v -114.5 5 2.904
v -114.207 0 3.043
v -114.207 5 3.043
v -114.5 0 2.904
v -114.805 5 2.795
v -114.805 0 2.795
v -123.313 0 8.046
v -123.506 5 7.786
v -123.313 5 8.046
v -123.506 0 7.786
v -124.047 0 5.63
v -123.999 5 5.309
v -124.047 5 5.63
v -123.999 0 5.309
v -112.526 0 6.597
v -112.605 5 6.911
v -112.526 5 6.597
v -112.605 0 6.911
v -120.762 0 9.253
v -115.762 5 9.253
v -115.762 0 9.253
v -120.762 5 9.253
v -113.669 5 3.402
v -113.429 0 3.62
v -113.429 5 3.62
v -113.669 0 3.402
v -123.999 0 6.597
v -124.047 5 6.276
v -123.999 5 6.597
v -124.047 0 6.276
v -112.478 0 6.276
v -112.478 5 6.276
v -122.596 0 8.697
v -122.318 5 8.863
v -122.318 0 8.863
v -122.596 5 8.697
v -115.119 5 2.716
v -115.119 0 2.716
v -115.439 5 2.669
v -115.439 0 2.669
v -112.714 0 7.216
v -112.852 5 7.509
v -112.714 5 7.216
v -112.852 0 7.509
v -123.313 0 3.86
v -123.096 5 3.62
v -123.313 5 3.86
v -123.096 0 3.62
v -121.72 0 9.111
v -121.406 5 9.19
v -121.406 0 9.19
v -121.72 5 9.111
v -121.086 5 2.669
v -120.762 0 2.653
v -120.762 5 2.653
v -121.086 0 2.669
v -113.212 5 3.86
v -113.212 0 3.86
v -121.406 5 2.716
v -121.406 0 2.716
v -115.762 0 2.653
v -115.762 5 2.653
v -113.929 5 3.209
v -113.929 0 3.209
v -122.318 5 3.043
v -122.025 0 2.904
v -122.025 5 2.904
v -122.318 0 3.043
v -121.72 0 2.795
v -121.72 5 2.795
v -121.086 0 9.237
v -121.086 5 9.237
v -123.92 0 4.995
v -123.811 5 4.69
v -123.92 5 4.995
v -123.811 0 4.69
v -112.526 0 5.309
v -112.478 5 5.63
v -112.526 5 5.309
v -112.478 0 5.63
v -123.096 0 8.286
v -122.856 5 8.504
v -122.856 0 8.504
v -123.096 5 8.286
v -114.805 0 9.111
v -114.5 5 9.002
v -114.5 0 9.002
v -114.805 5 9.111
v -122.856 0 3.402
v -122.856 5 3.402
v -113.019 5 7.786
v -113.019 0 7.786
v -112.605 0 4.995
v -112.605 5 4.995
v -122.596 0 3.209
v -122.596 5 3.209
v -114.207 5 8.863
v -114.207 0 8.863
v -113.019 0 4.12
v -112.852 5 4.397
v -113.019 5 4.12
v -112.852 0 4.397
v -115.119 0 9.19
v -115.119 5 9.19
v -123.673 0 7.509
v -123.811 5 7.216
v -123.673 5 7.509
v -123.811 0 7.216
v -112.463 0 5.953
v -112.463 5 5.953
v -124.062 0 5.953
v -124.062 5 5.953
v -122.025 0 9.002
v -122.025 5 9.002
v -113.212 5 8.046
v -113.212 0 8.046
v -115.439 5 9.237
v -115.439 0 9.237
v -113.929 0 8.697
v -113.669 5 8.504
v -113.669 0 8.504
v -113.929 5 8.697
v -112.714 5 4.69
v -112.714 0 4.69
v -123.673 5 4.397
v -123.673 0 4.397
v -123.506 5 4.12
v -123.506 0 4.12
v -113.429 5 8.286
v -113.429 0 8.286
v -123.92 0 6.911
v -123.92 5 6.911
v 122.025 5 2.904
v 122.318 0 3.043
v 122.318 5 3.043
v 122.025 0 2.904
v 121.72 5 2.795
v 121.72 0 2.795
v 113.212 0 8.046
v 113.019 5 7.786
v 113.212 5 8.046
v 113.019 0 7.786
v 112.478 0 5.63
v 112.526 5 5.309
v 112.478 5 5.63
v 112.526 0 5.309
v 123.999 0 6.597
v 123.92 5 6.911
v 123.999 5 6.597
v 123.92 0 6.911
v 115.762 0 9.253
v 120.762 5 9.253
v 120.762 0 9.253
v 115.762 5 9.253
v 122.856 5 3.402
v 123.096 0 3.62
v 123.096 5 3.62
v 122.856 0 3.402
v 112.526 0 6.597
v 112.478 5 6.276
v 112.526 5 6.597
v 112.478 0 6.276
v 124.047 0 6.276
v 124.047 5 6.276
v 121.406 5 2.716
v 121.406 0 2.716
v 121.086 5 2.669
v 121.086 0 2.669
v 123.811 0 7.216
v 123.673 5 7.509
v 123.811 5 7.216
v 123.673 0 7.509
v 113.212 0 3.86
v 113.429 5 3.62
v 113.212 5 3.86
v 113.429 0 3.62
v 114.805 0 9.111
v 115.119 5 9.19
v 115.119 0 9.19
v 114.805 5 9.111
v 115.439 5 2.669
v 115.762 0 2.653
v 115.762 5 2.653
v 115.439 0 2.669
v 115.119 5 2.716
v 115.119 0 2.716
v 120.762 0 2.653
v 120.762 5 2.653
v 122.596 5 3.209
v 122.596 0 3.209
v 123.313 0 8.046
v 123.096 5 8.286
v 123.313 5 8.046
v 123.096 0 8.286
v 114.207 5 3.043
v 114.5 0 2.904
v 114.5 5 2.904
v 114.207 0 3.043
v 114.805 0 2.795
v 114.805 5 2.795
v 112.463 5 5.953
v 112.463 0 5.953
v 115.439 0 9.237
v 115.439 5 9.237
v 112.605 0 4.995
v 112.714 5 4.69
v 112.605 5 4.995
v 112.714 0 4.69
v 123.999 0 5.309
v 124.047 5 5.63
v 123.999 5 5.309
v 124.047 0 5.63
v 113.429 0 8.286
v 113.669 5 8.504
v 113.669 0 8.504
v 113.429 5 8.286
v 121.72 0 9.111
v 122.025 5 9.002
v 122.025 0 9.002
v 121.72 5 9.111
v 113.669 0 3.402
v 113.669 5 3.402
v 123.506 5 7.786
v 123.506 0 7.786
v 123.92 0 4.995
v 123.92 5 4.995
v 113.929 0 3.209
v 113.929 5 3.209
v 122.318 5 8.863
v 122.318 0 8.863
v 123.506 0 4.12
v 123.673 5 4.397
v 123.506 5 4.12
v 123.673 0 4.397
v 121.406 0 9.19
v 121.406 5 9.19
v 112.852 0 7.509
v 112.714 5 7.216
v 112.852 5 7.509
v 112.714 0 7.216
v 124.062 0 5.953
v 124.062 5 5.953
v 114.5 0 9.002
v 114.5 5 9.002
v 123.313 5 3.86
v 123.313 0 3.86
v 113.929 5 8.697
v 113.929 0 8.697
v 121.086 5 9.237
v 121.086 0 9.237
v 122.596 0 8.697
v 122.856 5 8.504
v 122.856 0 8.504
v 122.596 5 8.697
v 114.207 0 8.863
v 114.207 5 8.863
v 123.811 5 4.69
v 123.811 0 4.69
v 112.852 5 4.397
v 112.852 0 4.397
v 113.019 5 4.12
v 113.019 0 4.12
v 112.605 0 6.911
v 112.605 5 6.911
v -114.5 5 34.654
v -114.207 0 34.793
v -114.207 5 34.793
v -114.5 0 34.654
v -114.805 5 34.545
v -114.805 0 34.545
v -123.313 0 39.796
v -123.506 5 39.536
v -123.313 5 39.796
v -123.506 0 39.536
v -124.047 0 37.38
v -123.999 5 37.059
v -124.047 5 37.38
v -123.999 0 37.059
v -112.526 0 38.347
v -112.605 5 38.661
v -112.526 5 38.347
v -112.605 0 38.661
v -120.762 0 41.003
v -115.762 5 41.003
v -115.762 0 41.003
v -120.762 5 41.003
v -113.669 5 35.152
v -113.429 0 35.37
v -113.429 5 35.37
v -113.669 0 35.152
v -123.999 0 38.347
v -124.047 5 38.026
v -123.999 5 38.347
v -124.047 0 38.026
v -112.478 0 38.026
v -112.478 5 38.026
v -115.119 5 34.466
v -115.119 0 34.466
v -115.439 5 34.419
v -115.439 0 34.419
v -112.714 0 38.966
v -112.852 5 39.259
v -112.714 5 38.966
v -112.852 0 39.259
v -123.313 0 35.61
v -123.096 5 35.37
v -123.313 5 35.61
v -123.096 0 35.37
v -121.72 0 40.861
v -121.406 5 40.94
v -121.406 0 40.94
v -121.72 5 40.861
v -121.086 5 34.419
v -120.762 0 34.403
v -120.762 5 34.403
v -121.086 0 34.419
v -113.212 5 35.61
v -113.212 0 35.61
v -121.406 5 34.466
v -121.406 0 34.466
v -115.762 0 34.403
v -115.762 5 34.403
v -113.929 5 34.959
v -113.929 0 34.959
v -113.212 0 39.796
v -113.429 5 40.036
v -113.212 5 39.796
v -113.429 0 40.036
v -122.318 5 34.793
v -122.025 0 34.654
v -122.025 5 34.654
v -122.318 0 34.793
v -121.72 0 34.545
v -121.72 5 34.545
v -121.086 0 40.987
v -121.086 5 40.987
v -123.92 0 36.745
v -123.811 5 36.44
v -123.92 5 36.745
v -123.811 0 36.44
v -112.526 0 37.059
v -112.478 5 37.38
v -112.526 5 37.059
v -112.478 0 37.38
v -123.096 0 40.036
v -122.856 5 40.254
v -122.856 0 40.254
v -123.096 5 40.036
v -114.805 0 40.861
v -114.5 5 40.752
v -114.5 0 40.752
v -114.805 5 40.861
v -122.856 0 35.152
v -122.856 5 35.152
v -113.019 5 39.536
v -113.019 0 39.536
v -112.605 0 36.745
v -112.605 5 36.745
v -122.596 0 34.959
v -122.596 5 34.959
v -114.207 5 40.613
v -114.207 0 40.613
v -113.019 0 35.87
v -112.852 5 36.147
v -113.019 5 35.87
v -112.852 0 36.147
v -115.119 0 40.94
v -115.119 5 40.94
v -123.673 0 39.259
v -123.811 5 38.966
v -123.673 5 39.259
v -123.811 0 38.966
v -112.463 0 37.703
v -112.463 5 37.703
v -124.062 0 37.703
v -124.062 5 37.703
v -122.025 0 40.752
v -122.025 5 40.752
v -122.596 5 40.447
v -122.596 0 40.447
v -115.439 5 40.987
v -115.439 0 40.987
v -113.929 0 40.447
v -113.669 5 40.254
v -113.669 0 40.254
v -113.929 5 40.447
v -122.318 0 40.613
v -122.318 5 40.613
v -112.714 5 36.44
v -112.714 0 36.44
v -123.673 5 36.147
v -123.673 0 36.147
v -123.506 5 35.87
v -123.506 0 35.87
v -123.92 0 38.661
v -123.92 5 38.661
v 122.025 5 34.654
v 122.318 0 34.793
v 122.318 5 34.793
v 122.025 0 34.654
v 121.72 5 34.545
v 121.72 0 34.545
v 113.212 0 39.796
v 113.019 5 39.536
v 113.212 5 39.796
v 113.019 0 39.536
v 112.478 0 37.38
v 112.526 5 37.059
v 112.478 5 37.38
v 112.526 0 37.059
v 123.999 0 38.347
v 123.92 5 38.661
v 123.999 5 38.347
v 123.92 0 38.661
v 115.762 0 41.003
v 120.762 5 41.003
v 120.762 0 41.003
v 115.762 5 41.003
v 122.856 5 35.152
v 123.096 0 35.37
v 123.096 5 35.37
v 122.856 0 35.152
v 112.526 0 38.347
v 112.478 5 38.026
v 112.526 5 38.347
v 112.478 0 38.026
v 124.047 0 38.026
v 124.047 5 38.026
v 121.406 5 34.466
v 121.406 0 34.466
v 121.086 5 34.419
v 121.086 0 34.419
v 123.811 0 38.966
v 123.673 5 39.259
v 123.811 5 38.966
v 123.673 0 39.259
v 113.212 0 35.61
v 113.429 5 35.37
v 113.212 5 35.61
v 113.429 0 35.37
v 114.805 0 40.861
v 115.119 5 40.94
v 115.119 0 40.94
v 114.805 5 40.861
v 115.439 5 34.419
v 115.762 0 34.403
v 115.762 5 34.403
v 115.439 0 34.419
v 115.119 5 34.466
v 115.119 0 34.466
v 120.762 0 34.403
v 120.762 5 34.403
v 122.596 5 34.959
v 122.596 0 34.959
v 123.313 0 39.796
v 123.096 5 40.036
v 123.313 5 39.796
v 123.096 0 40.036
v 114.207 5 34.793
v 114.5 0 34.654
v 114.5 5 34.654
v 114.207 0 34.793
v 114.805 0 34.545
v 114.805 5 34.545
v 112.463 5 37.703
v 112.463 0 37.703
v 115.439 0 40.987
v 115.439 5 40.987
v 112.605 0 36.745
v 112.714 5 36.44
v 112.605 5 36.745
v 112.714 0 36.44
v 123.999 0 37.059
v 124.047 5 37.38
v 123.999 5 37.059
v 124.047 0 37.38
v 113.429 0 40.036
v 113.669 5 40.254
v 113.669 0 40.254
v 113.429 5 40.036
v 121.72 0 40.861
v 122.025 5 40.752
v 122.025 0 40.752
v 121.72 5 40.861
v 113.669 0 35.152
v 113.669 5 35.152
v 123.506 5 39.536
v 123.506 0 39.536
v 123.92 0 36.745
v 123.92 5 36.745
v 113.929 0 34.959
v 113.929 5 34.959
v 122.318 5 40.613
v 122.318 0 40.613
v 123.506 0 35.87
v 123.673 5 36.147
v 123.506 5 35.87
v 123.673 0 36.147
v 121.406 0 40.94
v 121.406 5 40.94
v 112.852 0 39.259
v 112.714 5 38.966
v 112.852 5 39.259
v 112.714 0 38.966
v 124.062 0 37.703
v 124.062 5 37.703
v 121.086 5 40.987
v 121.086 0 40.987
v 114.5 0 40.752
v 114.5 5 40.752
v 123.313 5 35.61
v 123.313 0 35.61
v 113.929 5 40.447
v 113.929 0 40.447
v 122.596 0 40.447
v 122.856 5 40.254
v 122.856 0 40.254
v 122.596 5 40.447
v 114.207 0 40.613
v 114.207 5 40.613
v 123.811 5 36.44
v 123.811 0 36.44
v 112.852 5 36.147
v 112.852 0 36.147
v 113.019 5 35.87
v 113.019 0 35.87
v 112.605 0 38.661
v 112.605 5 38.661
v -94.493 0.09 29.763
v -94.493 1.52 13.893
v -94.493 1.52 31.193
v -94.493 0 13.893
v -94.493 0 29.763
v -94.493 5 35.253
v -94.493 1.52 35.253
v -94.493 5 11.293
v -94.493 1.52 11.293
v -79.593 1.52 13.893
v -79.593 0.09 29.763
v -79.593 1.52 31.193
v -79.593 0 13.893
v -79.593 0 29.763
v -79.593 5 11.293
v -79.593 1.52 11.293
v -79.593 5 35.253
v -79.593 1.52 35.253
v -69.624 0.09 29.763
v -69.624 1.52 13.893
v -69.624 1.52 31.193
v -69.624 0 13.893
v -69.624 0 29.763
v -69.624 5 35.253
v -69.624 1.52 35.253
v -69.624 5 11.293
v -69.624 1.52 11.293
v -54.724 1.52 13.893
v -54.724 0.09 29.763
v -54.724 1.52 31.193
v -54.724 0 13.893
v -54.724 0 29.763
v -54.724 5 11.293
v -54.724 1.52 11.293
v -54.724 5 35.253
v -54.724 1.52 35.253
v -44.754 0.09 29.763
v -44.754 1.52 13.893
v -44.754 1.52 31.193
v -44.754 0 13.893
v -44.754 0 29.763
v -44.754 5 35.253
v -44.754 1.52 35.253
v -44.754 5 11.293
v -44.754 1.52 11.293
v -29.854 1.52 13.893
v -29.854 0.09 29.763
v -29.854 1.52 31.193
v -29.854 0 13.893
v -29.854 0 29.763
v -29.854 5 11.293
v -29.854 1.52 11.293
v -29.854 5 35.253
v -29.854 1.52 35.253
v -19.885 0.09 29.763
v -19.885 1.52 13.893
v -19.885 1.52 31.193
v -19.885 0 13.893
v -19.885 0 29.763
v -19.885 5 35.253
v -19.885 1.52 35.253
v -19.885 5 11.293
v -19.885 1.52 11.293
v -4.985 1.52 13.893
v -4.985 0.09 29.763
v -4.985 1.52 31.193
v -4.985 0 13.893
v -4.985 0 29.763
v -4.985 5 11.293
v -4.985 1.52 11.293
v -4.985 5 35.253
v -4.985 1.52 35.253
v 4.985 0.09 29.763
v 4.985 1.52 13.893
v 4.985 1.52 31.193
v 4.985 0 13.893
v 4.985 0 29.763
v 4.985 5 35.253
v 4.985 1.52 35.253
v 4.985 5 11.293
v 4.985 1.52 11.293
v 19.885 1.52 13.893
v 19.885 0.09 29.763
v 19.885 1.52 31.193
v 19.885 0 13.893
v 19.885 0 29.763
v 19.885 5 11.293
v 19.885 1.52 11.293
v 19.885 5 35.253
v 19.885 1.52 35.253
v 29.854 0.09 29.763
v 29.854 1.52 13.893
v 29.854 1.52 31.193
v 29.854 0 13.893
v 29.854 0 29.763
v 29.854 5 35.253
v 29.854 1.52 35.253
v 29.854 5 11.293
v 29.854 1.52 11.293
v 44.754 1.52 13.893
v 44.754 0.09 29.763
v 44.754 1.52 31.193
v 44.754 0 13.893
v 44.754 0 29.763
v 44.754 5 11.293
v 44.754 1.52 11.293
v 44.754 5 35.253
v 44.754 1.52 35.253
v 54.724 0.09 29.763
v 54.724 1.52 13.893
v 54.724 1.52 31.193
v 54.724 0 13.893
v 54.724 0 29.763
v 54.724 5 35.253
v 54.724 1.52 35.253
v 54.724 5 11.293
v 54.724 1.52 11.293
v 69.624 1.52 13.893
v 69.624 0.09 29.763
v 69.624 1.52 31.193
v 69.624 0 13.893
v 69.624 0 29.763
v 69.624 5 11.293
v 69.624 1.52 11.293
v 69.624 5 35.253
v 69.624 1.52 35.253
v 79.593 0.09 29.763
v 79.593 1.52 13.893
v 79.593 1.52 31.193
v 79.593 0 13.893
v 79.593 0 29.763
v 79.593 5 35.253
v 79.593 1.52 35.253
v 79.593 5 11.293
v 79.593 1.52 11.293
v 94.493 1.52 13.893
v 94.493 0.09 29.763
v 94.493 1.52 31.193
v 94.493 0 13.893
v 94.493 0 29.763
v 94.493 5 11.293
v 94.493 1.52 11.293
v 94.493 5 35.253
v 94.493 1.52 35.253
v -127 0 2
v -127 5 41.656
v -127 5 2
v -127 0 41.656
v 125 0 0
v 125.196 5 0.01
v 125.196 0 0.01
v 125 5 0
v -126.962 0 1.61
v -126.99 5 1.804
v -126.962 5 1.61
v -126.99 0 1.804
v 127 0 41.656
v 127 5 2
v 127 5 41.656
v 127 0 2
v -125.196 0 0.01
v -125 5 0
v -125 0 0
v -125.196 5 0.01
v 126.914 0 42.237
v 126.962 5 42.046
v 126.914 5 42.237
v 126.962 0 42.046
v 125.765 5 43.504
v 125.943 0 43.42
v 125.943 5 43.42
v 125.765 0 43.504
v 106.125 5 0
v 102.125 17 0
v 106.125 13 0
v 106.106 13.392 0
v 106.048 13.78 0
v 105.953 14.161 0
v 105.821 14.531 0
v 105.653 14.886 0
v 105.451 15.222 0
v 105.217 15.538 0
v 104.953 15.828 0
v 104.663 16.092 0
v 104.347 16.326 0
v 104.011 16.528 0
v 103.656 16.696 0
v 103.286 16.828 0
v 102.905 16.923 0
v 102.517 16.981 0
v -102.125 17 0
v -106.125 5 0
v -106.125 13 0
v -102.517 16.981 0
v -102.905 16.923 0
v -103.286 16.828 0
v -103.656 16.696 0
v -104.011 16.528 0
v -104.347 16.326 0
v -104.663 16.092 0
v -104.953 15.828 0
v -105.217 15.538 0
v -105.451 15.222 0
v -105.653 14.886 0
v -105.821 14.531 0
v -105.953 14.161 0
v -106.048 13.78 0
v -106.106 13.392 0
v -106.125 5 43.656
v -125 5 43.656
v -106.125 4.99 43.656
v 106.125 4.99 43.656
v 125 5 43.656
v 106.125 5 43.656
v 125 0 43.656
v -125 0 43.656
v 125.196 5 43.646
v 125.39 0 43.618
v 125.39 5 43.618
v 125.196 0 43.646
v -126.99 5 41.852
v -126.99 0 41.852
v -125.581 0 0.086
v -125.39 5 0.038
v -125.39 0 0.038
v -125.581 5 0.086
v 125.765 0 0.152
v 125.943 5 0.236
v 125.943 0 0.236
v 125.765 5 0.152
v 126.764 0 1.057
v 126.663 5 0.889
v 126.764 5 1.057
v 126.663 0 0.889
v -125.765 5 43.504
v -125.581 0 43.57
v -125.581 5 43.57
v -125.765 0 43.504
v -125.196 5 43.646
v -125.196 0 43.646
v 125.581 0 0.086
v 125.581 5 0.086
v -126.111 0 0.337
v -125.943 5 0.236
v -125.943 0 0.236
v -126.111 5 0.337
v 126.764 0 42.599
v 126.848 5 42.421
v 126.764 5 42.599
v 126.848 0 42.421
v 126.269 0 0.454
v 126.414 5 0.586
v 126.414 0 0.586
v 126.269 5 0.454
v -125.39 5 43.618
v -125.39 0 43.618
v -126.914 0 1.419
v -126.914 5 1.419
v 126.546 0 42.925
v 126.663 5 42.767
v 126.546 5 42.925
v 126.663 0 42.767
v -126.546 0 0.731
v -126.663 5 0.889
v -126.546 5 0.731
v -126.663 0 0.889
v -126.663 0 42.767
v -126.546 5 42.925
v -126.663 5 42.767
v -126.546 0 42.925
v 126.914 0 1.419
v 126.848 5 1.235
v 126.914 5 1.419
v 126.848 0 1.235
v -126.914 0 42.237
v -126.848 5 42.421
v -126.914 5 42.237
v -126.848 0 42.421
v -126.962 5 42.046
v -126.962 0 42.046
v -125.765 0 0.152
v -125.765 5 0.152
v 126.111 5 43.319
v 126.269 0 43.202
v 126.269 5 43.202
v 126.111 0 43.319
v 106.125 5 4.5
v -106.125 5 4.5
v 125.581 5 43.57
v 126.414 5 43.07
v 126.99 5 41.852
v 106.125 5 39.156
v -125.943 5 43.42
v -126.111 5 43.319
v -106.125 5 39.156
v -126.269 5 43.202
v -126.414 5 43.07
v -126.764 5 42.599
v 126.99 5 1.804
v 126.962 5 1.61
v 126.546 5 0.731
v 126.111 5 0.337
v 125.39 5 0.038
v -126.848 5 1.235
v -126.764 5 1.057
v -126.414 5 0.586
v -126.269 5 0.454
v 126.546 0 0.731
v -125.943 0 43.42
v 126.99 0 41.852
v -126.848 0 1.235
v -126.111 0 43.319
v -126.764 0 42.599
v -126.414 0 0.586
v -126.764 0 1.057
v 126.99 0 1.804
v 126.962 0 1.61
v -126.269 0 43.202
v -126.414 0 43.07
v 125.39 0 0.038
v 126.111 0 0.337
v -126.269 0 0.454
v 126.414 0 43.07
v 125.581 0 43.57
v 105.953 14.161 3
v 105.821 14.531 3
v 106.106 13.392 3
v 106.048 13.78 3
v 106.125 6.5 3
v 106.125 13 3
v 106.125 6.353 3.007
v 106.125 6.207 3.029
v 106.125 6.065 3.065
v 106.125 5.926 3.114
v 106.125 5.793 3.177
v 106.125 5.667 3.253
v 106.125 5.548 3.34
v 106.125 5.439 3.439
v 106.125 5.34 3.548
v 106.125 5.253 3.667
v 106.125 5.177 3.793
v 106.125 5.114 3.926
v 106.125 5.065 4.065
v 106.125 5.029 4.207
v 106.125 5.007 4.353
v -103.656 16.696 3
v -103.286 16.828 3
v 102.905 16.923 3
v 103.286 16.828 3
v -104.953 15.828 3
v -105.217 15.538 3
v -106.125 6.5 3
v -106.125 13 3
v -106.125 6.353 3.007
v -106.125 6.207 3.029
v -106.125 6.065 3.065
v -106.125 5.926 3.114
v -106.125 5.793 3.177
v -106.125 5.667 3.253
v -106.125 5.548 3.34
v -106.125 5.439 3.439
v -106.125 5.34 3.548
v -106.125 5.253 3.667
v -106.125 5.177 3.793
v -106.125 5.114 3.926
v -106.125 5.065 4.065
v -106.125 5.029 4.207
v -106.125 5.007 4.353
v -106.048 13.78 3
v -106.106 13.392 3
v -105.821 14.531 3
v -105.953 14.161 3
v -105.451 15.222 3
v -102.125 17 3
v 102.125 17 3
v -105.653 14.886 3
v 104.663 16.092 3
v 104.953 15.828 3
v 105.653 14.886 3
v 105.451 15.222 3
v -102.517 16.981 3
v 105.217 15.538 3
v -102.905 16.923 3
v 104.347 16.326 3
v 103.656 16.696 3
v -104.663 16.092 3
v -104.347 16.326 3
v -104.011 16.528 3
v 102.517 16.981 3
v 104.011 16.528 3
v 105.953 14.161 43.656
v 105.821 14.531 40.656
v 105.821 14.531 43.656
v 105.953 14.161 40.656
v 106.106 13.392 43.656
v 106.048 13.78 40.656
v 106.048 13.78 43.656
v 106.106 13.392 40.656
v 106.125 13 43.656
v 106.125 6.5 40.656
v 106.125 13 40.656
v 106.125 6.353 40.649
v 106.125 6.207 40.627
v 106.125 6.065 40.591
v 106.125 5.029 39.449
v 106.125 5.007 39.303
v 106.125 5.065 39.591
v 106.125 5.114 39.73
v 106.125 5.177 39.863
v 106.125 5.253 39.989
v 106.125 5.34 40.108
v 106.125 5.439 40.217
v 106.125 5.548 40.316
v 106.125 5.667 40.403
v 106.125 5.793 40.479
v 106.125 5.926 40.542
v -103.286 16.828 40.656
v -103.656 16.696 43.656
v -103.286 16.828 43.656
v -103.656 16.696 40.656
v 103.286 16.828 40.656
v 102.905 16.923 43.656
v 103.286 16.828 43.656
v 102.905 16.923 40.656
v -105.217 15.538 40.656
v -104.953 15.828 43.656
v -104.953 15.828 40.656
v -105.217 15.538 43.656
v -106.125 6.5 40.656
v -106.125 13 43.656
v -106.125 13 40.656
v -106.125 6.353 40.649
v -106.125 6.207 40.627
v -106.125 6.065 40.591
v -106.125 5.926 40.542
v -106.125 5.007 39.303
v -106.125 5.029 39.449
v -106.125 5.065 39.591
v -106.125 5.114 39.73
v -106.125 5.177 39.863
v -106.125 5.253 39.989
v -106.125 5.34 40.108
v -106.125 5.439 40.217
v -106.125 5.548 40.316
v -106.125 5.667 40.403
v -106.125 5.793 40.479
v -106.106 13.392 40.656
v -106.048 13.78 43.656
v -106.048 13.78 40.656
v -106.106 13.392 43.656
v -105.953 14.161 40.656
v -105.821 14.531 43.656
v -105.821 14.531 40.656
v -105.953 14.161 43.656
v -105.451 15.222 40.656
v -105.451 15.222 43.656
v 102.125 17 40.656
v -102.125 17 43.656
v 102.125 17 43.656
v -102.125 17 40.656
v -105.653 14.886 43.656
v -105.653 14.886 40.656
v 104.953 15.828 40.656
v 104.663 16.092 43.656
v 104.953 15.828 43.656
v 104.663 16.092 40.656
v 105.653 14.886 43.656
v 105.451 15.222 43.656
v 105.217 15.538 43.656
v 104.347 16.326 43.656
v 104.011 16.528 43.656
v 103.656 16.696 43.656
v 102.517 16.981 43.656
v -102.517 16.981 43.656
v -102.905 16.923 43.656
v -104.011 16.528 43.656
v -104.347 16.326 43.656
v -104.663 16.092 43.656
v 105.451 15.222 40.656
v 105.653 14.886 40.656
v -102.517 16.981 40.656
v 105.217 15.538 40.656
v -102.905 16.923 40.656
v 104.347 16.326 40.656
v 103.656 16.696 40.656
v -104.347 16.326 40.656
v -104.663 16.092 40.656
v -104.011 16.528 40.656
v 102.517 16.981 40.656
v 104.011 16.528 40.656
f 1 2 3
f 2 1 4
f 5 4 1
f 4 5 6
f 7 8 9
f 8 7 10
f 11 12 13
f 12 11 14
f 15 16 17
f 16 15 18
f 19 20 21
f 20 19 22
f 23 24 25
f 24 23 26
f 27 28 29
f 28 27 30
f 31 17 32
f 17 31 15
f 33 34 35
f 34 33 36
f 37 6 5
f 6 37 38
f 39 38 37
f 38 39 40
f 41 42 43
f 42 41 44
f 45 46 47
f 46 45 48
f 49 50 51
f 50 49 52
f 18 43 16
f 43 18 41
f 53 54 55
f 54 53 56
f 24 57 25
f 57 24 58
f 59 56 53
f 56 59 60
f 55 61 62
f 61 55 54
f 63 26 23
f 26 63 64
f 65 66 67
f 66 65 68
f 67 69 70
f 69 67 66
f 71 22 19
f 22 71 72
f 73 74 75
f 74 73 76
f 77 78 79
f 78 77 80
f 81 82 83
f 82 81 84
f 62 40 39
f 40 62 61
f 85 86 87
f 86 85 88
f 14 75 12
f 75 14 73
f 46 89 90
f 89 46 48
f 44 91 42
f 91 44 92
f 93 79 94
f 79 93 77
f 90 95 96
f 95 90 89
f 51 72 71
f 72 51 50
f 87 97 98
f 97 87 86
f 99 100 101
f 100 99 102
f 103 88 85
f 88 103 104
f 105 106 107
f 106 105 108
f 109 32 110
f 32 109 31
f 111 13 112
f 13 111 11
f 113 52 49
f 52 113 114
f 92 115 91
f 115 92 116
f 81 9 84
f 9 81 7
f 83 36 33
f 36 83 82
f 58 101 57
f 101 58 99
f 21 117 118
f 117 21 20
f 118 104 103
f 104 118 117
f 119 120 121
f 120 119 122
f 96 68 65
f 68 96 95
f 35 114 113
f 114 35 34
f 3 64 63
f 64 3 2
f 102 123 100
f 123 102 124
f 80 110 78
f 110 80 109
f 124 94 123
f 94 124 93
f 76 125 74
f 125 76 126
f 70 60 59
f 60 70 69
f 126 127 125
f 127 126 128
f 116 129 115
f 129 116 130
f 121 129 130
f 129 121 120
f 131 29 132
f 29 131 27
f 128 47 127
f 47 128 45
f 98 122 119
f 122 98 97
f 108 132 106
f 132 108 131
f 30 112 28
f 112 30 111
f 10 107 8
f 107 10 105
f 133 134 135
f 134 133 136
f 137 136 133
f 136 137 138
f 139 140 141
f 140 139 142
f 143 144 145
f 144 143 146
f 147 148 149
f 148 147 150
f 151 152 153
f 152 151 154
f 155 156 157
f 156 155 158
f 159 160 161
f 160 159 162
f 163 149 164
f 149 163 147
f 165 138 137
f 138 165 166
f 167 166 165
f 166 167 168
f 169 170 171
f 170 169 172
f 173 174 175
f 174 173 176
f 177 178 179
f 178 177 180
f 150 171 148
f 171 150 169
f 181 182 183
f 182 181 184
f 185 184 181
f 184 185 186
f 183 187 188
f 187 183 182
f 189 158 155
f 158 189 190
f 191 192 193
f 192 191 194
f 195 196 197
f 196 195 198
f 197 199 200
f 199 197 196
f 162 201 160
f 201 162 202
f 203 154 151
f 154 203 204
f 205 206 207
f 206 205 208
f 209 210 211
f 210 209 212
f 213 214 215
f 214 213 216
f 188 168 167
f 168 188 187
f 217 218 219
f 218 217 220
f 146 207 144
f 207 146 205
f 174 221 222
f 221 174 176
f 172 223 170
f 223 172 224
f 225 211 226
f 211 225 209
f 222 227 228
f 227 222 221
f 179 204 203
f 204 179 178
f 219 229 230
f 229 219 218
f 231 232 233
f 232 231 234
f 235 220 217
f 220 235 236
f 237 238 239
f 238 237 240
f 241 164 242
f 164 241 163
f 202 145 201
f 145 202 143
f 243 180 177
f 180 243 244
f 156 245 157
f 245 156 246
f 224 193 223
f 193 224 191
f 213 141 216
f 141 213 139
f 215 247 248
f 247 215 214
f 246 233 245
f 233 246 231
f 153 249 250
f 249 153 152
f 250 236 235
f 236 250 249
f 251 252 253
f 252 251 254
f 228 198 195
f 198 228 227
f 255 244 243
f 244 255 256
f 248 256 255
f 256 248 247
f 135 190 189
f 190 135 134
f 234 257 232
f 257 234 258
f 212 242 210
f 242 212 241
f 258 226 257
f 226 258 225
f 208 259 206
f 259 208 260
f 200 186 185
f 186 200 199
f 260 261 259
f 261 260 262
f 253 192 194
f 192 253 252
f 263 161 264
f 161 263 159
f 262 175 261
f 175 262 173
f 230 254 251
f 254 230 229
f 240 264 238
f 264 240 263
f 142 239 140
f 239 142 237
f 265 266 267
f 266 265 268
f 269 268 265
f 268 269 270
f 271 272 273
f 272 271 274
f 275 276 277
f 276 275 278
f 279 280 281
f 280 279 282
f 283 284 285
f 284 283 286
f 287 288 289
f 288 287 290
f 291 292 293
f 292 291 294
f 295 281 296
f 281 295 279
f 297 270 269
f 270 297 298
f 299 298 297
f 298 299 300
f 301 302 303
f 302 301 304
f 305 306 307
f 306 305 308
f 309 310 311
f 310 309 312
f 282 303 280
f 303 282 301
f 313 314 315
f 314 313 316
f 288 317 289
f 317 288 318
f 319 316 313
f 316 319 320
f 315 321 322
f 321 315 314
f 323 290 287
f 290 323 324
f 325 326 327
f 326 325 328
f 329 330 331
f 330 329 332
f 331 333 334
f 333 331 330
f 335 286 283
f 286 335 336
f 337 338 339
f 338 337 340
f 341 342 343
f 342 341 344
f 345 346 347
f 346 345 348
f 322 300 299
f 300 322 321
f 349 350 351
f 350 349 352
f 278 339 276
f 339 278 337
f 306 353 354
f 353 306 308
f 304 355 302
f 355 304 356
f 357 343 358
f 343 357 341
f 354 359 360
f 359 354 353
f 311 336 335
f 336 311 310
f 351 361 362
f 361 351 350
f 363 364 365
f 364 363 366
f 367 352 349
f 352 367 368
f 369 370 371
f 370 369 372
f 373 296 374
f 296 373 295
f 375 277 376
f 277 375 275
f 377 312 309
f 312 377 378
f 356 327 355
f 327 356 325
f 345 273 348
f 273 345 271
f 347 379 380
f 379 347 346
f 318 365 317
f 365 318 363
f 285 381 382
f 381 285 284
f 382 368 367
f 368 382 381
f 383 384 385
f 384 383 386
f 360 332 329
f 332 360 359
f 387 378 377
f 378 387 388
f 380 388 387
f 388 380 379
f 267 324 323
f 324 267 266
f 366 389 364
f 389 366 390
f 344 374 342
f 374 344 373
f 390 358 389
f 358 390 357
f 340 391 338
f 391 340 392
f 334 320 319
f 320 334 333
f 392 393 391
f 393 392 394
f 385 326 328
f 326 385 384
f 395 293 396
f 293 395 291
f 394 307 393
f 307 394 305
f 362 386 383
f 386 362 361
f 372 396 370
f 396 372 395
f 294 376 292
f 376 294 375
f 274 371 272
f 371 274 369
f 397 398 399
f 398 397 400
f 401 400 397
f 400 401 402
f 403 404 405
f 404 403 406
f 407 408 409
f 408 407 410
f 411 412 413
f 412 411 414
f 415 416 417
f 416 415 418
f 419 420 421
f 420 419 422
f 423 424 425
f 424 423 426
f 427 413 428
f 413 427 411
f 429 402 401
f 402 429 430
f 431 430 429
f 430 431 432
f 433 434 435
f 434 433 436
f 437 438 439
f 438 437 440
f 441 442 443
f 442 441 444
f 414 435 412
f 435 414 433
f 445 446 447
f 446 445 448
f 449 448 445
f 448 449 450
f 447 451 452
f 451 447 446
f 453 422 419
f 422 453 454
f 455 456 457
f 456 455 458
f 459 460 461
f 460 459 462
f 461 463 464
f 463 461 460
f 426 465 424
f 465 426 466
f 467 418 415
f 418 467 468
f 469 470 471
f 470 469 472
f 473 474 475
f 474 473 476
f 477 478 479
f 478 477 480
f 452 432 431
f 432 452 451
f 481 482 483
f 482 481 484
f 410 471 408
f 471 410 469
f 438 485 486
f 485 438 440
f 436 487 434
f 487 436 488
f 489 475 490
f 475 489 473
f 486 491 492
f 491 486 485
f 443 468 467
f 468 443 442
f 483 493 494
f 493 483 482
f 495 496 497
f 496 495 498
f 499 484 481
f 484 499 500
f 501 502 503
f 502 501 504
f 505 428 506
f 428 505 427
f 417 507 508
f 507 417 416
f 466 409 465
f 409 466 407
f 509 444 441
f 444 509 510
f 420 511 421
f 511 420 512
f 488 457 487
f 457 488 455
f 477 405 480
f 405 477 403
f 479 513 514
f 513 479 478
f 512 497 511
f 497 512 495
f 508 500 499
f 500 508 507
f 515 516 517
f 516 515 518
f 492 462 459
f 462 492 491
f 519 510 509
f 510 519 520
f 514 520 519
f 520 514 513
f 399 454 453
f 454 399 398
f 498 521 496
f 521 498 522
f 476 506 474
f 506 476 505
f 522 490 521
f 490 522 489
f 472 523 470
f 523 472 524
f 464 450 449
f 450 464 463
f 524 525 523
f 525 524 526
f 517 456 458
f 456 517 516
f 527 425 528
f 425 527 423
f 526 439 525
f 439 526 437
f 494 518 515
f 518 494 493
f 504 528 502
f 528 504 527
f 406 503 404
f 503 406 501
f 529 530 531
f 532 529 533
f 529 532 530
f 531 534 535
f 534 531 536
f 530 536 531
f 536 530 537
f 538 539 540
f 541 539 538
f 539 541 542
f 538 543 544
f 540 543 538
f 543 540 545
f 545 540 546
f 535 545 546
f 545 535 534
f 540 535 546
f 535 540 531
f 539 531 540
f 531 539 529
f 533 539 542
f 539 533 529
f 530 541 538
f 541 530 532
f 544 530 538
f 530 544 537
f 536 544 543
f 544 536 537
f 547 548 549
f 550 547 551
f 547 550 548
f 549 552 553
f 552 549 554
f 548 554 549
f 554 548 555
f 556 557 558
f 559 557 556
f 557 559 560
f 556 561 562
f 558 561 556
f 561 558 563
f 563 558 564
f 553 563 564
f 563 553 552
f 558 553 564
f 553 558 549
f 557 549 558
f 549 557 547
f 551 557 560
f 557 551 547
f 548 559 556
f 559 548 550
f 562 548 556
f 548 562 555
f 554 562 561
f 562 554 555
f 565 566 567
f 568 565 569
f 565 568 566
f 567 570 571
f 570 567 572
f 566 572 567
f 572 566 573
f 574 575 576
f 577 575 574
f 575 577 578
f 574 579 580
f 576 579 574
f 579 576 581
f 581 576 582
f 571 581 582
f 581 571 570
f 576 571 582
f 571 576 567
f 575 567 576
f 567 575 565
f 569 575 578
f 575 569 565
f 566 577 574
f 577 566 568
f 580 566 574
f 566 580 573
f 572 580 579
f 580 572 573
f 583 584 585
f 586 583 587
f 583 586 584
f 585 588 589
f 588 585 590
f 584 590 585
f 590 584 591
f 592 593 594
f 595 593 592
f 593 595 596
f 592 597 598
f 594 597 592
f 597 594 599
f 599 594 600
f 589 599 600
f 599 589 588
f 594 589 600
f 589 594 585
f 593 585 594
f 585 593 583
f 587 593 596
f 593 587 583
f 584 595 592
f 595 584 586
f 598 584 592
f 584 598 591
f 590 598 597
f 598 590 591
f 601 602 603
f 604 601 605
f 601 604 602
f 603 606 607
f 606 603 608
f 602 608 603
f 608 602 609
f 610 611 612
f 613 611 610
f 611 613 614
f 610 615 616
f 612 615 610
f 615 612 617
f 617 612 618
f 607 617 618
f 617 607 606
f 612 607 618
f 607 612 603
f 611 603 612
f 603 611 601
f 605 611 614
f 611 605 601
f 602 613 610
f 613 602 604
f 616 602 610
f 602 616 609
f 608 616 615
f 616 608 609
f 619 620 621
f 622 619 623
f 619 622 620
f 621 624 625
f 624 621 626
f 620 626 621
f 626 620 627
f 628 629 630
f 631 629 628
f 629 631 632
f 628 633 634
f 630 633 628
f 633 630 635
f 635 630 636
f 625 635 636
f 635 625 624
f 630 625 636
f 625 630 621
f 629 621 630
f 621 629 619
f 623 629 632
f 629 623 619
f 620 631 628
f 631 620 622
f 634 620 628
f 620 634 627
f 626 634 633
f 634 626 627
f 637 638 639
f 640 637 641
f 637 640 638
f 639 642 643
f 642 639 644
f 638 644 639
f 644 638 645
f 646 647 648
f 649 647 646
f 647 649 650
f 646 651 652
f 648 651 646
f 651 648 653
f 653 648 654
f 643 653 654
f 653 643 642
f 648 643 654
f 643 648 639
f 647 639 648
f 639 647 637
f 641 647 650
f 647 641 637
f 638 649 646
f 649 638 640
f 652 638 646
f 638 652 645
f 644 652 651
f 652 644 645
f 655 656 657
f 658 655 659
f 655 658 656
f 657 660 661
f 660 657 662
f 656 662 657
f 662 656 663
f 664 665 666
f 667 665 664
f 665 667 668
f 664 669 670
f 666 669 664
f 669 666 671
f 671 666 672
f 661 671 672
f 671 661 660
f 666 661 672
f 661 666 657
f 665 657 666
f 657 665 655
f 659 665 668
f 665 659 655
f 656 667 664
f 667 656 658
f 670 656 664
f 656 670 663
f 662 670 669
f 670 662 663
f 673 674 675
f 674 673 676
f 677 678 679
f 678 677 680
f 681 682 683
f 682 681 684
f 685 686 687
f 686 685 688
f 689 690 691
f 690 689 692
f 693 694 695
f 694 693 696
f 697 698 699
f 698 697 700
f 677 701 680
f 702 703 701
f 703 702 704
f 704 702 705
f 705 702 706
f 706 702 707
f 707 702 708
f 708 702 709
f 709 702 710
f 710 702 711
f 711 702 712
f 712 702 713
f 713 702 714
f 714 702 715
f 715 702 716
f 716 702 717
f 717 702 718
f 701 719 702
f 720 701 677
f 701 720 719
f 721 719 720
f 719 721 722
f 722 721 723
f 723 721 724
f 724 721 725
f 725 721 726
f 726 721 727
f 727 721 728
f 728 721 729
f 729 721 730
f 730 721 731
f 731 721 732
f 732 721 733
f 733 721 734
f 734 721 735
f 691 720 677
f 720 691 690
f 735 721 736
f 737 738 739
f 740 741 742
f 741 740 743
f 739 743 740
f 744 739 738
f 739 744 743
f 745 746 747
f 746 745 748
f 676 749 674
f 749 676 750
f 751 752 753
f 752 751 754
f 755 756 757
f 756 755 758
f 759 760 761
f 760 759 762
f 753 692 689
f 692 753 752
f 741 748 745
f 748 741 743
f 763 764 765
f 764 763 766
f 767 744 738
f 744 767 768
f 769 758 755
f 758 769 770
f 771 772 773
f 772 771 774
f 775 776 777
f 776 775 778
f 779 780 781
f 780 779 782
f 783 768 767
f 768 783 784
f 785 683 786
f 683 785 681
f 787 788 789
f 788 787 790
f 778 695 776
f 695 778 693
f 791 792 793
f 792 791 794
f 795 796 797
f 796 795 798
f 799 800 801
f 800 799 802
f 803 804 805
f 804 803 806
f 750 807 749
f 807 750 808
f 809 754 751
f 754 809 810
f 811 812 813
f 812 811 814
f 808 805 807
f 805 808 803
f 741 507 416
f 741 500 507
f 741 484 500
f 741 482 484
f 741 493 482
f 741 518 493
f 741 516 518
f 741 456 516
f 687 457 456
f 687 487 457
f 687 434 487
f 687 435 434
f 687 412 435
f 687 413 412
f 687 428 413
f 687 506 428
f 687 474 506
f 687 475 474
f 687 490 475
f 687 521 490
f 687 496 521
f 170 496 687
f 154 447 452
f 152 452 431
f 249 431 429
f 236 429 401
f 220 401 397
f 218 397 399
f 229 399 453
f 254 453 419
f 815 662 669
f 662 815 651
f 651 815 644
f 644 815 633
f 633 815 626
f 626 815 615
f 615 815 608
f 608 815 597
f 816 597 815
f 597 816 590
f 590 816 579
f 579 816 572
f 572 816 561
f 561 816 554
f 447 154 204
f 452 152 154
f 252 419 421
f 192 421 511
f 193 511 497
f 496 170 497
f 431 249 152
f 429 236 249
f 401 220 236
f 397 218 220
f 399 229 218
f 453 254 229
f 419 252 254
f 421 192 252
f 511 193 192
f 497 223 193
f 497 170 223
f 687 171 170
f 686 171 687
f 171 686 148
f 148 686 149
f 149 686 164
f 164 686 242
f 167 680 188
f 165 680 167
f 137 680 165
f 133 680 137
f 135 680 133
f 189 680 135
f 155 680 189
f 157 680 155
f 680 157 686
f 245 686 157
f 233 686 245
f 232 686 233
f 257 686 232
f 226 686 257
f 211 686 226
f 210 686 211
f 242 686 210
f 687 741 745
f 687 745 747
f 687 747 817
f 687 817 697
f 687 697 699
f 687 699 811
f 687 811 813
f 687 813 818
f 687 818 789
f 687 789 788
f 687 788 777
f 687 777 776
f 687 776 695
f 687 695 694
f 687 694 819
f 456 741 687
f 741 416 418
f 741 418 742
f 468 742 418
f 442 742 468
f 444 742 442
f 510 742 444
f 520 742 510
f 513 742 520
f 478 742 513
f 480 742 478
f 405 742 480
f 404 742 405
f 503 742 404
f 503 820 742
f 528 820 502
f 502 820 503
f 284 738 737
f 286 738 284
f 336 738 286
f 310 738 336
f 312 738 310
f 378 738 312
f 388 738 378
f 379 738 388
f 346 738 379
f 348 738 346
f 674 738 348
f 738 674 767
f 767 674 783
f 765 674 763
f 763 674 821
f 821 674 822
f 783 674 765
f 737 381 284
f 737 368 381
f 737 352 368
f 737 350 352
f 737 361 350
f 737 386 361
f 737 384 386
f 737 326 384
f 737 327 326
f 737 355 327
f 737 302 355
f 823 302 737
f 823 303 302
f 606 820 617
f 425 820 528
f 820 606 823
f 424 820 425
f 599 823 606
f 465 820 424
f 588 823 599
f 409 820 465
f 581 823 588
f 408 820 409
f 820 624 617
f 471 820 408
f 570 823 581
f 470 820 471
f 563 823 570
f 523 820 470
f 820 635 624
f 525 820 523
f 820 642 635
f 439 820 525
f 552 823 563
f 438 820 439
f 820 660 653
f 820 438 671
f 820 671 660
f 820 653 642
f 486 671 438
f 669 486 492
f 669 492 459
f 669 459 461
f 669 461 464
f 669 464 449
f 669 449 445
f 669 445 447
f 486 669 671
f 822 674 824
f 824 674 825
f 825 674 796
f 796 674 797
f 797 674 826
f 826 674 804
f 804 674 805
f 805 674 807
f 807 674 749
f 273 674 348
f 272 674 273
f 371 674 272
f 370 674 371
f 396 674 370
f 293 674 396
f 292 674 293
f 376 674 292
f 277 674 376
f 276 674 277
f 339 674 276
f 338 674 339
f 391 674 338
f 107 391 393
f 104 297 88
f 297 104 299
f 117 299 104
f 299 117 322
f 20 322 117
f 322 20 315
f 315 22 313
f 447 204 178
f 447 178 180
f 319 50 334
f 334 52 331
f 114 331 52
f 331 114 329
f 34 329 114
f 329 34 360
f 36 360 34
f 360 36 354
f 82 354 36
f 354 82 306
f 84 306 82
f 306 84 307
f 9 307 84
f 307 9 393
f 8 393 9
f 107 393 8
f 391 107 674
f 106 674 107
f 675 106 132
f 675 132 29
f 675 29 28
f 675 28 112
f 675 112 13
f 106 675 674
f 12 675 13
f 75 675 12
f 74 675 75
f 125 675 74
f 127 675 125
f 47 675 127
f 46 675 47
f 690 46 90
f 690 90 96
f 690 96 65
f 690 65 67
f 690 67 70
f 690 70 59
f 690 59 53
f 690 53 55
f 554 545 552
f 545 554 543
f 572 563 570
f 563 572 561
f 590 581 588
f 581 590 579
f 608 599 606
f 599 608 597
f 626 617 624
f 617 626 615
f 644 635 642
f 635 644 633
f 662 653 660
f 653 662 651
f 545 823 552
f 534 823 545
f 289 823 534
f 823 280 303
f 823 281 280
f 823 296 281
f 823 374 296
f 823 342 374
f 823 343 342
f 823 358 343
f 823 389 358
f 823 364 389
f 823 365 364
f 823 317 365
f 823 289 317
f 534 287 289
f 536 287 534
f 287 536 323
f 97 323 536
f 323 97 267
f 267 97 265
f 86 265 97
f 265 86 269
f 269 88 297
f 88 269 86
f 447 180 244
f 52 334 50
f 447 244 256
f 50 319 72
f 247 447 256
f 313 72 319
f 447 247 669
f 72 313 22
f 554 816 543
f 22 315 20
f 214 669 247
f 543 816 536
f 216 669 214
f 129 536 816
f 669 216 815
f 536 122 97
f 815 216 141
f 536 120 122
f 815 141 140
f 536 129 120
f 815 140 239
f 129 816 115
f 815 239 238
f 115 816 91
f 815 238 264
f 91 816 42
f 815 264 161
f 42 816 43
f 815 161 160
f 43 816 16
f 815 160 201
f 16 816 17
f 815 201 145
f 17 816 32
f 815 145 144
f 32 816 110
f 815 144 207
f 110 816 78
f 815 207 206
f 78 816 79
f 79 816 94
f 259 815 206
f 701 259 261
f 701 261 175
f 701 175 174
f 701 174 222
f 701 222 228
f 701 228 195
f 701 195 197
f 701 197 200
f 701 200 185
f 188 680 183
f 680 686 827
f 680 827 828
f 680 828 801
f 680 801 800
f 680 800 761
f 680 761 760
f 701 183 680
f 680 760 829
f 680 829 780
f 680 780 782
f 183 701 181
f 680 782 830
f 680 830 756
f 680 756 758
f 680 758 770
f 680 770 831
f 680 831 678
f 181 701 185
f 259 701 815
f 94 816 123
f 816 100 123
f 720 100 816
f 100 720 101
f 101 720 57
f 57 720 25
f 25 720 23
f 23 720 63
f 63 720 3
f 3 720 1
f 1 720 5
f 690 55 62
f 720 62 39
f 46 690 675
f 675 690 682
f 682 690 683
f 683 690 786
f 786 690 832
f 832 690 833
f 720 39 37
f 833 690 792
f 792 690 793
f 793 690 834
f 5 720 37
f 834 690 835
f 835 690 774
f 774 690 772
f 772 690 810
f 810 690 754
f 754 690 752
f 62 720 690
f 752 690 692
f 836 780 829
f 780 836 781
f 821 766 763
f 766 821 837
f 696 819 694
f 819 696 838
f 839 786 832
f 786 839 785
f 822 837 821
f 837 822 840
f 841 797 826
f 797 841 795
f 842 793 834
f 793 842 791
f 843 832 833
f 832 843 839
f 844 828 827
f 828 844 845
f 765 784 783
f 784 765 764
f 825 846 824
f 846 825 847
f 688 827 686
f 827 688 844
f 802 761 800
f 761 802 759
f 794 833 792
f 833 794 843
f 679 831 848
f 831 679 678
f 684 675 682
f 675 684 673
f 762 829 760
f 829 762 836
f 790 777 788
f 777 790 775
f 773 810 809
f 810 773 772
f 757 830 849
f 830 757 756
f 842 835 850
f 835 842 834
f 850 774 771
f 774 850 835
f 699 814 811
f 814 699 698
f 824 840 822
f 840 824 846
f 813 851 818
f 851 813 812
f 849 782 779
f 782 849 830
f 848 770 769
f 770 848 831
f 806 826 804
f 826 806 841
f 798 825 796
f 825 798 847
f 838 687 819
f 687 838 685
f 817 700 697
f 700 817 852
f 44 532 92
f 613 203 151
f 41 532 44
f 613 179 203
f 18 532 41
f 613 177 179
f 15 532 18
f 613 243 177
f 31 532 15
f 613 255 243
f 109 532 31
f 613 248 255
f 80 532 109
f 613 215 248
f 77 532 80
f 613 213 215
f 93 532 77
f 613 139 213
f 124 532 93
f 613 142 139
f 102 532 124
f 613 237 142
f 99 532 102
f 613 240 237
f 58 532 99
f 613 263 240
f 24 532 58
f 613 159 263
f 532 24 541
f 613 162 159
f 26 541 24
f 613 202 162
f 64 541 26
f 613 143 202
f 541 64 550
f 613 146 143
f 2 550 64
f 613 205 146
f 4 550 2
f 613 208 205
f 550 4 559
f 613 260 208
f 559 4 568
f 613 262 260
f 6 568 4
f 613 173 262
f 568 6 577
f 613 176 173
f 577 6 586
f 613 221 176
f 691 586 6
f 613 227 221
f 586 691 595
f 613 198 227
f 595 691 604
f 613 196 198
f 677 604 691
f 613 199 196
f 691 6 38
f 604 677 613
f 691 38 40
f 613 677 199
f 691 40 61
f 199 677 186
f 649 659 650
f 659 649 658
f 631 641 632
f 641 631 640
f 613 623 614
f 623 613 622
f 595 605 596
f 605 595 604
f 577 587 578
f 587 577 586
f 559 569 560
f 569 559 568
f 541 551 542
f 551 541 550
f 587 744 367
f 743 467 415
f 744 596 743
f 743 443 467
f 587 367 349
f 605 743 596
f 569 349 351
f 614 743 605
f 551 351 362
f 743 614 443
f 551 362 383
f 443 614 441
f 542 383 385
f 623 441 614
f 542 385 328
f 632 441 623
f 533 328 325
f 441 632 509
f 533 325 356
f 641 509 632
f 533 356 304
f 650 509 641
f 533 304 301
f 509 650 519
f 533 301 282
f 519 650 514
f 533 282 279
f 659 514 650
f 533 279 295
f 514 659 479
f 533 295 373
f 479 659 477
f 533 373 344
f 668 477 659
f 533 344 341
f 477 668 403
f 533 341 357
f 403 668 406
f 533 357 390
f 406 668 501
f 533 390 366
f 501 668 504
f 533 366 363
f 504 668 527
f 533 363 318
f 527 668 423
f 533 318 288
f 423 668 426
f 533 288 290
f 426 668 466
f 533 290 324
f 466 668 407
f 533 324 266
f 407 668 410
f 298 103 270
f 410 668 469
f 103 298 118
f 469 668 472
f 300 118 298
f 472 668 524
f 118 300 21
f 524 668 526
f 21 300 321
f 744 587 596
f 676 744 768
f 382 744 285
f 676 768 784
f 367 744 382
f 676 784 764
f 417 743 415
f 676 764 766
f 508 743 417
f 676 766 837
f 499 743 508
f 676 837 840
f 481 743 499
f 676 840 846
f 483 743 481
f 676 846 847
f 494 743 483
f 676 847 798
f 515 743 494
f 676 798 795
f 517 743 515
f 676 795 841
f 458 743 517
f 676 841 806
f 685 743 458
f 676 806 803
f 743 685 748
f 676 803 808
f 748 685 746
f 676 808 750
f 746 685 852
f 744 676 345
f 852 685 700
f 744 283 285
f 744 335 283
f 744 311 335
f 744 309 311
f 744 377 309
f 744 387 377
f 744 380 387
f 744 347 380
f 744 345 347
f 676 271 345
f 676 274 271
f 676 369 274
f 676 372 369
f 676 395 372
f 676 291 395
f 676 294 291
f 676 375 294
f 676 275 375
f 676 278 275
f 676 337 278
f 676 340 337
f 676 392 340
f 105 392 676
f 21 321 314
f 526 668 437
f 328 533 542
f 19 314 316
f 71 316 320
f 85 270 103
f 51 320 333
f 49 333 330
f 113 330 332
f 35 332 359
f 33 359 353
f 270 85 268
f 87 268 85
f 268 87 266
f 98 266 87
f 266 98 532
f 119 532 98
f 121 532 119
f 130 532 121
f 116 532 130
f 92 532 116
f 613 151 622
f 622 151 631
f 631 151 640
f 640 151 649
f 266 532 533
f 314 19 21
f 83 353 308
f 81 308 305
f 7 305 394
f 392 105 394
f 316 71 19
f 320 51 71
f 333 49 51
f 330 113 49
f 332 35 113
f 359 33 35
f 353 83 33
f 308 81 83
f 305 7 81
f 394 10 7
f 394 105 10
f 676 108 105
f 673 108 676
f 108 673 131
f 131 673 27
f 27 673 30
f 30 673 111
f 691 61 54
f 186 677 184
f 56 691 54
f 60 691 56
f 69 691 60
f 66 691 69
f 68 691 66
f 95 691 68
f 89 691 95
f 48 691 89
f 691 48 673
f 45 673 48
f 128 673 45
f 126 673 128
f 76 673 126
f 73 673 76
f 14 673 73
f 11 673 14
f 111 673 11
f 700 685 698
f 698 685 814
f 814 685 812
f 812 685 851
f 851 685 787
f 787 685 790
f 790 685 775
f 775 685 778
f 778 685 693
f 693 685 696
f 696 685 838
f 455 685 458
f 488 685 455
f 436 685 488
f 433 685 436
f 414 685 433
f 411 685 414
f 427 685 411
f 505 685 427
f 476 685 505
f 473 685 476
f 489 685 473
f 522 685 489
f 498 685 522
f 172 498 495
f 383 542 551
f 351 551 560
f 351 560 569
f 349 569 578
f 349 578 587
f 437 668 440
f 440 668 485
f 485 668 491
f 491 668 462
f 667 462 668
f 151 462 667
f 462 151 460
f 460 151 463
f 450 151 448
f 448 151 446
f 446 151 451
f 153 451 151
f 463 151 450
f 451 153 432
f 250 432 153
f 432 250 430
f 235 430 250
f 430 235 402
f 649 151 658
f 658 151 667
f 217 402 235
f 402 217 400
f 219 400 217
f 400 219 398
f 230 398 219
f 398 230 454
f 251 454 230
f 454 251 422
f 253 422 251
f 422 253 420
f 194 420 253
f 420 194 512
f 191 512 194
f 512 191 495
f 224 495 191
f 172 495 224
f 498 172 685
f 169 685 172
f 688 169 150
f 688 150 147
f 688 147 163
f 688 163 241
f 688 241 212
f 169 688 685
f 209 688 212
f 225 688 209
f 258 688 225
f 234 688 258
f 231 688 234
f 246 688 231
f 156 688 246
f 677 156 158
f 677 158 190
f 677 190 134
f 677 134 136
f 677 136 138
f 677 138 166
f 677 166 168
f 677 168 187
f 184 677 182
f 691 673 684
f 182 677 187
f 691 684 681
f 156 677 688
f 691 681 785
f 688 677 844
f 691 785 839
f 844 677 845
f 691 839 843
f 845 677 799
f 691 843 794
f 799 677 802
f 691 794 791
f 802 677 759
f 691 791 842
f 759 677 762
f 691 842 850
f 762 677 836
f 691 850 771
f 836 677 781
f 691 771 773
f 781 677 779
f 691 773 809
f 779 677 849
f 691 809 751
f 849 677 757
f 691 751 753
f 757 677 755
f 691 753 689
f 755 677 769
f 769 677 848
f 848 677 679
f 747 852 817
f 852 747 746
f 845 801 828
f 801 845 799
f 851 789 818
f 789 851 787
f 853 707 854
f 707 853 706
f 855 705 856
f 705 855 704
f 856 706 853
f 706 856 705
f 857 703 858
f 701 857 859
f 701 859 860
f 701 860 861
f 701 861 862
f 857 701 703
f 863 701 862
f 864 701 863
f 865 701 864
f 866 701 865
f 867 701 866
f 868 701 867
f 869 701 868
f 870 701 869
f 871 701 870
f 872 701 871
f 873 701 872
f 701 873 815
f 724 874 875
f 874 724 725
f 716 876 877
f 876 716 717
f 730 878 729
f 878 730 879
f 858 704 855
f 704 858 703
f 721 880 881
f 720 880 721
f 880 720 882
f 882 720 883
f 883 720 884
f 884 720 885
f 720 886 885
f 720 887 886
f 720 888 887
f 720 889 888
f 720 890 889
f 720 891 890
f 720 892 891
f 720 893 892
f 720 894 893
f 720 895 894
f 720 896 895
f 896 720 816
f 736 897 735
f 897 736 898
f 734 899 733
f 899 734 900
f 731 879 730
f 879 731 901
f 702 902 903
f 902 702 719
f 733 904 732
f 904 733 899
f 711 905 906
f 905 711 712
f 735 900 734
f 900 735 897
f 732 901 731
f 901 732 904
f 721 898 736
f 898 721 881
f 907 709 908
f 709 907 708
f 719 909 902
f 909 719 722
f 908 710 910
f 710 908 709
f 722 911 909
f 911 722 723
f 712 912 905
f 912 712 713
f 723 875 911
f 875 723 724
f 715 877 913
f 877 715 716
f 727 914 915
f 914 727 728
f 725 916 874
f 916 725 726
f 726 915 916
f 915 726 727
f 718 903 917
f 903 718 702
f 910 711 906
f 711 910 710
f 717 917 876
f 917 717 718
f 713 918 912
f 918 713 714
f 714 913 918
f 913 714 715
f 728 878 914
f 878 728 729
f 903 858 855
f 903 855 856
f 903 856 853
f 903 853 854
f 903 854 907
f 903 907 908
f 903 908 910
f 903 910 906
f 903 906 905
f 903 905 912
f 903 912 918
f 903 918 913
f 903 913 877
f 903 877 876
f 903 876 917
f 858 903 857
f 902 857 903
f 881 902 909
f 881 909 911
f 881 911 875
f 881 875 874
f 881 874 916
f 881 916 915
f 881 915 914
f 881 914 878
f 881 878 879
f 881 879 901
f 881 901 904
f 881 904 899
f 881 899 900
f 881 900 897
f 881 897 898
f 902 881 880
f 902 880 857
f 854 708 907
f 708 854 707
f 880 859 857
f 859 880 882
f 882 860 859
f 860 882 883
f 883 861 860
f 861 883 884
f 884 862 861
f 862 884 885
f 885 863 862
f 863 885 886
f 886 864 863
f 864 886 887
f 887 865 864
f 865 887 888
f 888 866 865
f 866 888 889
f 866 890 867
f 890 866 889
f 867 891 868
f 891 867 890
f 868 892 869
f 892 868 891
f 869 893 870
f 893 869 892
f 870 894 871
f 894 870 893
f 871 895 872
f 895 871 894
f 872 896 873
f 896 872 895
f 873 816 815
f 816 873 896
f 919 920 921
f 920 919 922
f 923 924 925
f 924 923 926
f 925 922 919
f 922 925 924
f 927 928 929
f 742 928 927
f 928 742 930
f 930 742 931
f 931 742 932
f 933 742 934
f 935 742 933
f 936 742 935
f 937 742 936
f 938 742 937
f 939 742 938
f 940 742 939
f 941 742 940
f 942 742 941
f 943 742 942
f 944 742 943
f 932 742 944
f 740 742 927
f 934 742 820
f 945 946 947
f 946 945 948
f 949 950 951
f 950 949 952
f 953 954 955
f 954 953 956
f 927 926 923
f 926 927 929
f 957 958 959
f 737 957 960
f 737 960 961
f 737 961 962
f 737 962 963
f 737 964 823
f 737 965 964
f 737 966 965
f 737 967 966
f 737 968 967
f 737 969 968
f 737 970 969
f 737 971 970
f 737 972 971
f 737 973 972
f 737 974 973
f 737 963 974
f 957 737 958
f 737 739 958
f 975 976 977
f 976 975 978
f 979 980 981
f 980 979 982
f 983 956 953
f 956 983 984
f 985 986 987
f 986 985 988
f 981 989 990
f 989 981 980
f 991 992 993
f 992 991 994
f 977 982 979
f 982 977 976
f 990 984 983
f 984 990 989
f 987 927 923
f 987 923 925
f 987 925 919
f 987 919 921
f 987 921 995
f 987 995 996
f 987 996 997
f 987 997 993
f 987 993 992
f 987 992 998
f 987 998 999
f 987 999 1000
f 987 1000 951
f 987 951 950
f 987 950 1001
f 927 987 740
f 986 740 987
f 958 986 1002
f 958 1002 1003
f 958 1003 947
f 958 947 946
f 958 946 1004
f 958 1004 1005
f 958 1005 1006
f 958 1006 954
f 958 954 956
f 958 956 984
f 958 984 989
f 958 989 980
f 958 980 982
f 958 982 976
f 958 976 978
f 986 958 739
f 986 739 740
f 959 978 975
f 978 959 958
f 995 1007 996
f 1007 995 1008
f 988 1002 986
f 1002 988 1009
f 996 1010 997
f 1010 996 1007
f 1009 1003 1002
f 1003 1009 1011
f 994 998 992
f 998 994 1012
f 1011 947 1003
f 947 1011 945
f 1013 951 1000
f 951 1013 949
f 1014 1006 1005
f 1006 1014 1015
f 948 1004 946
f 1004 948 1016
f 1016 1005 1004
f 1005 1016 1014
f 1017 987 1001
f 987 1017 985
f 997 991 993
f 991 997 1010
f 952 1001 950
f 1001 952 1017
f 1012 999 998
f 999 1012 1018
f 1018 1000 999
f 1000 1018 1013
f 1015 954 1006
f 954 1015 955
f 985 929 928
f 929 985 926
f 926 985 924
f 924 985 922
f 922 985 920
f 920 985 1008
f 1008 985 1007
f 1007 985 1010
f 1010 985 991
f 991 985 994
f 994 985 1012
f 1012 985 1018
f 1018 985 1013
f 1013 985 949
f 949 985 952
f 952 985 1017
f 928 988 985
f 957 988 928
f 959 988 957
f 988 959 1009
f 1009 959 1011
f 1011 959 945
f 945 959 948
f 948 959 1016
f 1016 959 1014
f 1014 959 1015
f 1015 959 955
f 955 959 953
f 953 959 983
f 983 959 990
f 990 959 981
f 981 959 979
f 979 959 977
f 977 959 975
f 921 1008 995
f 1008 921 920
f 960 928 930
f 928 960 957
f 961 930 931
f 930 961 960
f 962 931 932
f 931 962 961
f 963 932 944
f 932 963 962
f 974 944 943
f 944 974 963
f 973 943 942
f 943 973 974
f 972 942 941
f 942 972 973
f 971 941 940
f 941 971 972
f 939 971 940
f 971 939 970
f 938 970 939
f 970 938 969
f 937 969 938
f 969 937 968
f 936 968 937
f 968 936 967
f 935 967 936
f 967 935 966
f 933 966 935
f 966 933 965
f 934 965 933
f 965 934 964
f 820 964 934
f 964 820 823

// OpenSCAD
// Connector panel R4p2: 1U panel for a 10" benchtop rack with a row of eight
// keystone jacks and no Neutrik connectors.
// Geometry comes from ../lib/rack10.scad; see README.md here for the design rules.
//
// Print with the front panel face down on the bed (print_orientation = true).
// test_coupon prints a small plate with the same cuts instead of the whole panel.

use <../lib/rack10.scad>

/* [Connectors] */
// left to right seen from the front: "neutrik_d_rear", "neutrik_d" or "keystone"
connectors = [for (i = [1 : 8]) "keystone"];
spacing = -1;               // gap between pockets in mm; -1 spreads the row evenly
skin = 2;                   // panel thickness left at Neutrik D connectors

/* [Stiffeners] */
stiffeners = "both";        // [both, top, bottom, none] lips on the back along the edges
stiffener_t = 3;            // lip thickness
stiffener_depth = 12;       // how far the lips reach back from the panel

/* [Panel] */
rack_u = 1;

/* [Rendering] */
print_orientation = false;  // true: lay the panel with the front on the bed
test_coupon = "none";       // [none, connectors, keystone_depths] print a small plate instead: one of each connector type, or keystones with stop lips at 7.5, 8 and 8.5 mm
$fn = 64;

print_oriented(print_orientation) {
    if (test_coupon == "connectors")
        connector_test_coupon(["neutrik_d_rear", "keystone"], skin = skin);
    else if (test_coupon == "keystone_depths")
        keystone_test_coupon();
    else
        connector_panel(connectors, rack_u = rack_u,
                        spacing = spacing < 0 ? undef : spacing, skin = skin,
                        stiffeners = stiffeners, stiffener_t = stiffener_t,
                        stiffener_depth = stiffener_depth);
}
